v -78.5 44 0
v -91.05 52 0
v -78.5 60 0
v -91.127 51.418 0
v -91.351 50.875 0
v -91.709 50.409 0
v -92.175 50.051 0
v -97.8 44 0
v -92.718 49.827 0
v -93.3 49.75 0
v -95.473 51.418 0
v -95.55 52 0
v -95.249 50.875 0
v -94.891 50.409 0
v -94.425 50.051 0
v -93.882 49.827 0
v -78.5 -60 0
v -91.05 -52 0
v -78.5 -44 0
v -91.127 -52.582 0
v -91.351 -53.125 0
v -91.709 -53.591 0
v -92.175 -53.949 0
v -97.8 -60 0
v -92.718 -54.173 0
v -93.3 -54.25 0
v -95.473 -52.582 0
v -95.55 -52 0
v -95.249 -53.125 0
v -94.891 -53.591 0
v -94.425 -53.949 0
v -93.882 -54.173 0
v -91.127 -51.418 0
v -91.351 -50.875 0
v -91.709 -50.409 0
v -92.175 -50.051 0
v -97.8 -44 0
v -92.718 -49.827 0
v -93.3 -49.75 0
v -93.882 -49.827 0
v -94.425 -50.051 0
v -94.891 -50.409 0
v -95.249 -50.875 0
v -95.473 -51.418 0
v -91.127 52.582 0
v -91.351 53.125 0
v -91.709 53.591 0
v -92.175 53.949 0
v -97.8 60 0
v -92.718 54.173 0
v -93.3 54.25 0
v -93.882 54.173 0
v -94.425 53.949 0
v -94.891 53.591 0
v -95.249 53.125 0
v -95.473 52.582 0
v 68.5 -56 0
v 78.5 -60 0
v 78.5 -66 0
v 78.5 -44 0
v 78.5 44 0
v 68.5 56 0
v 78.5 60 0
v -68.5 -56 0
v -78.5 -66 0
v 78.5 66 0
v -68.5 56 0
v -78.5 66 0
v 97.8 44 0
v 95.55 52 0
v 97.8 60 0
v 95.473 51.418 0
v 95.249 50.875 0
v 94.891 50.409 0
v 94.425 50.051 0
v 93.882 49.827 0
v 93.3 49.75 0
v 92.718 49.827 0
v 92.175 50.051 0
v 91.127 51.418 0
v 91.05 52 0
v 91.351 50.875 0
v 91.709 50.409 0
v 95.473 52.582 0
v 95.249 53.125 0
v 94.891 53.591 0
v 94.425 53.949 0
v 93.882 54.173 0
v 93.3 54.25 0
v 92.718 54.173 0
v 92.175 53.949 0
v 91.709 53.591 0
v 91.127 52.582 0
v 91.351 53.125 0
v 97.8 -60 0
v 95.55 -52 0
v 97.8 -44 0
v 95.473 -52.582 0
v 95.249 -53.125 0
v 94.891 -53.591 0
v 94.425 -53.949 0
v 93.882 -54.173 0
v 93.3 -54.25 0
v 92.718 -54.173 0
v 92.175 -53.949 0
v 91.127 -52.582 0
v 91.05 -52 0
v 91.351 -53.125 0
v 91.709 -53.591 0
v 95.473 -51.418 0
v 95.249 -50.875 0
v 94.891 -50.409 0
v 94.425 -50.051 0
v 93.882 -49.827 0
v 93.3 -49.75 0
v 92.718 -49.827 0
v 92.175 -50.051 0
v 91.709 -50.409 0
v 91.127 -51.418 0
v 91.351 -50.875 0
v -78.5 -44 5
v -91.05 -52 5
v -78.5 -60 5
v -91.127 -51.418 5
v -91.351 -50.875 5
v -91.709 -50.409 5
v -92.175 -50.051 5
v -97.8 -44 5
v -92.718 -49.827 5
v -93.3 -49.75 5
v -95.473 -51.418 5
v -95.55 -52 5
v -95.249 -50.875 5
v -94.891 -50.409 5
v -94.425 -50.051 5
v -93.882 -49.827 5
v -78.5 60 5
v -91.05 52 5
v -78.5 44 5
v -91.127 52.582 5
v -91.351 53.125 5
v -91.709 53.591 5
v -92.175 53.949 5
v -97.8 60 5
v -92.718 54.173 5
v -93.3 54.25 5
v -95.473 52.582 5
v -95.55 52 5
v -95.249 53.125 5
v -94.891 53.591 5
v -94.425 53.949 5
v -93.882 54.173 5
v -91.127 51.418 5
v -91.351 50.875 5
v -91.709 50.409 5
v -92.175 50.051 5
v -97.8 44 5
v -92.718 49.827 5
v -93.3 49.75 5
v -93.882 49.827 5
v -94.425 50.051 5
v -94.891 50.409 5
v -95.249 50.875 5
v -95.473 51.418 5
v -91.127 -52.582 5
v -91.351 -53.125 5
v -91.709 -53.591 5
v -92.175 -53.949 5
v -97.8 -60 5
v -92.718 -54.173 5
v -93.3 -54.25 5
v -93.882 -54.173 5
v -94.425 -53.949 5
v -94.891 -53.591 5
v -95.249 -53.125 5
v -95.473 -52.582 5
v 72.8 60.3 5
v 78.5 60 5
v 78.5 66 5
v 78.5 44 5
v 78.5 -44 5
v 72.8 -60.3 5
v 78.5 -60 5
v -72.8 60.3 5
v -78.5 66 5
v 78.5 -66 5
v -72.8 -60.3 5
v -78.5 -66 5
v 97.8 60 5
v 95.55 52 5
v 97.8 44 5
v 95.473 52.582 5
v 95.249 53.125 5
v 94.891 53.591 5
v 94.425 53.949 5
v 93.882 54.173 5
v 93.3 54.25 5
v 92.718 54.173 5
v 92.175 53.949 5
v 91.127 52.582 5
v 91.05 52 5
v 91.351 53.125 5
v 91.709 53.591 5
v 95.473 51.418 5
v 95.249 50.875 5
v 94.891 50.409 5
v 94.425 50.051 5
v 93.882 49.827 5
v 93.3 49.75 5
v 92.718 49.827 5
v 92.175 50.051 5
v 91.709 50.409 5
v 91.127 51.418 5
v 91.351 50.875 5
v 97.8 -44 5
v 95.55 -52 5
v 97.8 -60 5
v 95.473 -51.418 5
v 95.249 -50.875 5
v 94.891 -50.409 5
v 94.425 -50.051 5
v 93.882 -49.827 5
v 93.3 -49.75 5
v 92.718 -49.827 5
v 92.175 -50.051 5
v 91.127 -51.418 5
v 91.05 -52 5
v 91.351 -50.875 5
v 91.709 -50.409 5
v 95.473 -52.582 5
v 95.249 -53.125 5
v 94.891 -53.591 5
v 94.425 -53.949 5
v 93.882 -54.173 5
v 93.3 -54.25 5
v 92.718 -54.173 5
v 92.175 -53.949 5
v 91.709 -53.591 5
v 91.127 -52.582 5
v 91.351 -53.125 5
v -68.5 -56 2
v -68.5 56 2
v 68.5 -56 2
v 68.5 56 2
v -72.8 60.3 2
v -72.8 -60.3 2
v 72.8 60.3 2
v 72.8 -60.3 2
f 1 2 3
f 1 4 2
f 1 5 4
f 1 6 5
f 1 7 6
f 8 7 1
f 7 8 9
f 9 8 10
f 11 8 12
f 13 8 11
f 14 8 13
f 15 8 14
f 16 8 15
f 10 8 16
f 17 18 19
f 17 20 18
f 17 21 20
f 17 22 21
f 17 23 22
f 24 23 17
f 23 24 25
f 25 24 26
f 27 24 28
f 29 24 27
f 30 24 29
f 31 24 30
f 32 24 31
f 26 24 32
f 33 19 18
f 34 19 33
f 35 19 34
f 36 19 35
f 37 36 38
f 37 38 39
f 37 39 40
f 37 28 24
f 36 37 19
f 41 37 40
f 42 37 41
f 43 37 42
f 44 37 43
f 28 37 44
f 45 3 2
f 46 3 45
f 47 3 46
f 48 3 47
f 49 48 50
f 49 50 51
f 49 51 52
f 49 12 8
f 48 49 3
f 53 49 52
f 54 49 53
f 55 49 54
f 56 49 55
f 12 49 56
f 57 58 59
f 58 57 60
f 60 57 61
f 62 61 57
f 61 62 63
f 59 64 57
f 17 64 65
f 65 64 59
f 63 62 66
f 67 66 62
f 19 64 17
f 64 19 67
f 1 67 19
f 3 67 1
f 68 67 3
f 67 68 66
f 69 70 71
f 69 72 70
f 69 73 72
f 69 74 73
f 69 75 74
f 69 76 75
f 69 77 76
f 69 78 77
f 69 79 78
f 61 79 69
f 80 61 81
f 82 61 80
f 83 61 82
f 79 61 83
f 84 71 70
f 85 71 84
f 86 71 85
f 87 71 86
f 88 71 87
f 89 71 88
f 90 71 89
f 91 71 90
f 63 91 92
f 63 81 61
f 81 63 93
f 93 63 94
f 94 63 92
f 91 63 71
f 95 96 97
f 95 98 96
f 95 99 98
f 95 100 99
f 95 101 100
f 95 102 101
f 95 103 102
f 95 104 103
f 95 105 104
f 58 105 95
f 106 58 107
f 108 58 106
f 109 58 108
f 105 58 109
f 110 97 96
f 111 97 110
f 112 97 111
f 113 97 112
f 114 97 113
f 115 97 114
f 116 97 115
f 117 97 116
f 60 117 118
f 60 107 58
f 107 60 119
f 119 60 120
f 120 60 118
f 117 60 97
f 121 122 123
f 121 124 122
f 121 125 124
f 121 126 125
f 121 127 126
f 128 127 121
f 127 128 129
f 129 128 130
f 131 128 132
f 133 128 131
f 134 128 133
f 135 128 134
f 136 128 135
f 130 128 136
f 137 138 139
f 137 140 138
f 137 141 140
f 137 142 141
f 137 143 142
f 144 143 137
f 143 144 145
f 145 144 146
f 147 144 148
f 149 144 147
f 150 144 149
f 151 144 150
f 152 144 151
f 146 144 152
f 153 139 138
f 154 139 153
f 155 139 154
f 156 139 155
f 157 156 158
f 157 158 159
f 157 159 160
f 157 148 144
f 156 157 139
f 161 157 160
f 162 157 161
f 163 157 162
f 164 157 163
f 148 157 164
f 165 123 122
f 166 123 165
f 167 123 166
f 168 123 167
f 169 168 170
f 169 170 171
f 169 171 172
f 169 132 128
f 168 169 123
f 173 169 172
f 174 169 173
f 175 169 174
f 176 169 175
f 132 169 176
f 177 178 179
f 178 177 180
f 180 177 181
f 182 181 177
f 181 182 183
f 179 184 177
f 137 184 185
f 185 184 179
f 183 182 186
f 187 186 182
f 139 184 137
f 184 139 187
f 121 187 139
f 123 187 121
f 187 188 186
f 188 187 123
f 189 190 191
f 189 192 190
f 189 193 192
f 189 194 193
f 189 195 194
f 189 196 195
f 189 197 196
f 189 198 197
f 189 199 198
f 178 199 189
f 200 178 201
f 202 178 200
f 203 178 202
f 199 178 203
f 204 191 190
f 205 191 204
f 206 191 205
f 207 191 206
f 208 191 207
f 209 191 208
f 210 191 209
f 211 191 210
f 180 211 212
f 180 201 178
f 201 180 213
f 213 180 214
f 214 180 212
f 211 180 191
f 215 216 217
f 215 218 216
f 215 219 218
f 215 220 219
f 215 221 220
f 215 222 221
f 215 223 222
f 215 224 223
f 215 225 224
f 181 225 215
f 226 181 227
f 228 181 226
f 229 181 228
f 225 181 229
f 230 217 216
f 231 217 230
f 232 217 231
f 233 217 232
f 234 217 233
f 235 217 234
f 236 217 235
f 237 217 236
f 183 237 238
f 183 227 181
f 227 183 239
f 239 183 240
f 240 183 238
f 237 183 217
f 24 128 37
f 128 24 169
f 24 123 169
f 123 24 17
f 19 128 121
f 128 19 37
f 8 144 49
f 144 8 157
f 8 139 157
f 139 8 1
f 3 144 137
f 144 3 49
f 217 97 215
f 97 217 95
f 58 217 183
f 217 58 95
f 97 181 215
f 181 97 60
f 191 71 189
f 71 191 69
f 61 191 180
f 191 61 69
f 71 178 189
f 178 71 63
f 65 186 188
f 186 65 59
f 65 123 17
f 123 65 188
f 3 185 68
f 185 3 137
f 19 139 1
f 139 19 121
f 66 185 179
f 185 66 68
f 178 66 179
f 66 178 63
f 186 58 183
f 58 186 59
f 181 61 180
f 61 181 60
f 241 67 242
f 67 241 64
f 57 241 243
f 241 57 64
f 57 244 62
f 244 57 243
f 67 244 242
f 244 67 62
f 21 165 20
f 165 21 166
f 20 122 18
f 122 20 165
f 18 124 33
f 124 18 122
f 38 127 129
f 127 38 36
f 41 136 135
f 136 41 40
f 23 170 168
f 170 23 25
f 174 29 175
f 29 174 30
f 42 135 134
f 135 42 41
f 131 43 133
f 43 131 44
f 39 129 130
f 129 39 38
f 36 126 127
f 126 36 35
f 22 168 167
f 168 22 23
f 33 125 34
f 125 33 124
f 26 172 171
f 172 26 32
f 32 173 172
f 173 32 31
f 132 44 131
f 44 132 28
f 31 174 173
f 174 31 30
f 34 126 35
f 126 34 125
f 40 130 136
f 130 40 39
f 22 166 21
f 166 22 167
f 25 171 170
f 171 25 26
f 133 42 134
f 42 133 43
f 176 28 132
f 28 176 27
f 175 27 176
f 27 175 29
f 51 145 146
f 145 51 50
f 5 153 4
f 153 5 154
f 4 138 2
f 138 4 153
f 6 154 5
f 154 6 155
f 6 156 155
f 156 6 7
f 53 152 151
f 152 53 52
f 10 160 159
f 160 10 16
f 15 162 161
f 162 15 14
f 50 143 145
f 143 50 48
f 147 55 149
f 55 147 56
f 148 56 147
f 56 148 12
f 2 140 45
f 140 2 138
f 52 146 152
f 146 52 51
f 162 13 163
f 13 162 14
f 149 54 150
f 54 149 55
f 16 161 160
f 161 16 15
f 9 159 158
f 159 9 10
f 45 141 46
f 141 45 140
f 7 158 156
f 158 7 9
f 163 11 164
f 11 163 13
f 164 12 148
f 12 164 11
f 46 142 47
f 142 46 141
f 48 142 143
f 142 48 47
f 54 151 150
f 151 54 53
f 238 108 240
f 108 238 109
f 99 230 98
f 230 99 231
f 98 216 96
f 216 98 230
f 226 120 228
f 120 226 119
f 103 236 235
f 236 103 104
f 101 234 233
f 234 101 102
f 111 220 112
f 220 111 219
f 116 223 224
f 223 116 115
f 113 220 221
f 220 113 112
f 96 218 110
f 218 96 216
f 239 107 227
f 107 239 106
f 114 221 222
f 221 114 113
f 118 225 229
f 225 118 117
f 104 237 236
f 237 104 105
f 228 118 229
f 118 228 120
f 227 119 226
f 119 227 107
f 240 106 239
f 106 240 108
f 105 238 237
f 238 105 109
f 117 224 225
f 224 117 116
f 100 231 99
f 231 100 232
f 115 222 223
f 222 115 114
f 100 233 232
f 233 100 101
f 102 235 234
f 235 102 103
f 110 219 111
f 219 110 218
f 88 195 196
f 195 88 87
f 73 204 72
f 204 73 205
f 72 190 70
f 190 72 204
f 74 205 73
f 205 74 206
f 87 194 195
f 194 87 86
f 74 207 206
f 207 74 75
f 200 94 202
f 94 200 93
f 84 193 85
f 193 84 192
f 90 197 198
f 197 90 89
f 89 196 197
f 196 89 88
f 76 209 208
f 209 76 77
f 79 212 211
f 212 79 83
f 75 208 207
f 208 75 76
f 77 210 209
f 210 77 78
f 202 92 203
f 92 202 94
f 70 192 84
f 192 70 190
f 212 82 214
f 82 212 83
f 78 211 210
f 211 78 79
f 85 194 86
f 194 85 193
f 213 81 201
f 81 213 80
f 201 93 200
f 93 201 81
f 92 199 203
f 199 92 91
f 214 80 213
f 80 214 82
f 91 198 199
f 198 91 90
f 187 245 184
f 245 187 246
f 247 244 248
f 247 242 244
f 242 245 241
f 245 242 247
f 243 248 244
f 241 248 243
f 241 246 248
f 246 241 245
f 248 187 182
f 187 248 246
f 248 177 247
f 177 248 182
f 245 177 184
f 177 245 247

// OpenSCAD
include <../lib/meshtastic-drybag-node-lib.scad>;
$fn = 40;
solar_mount_print();
